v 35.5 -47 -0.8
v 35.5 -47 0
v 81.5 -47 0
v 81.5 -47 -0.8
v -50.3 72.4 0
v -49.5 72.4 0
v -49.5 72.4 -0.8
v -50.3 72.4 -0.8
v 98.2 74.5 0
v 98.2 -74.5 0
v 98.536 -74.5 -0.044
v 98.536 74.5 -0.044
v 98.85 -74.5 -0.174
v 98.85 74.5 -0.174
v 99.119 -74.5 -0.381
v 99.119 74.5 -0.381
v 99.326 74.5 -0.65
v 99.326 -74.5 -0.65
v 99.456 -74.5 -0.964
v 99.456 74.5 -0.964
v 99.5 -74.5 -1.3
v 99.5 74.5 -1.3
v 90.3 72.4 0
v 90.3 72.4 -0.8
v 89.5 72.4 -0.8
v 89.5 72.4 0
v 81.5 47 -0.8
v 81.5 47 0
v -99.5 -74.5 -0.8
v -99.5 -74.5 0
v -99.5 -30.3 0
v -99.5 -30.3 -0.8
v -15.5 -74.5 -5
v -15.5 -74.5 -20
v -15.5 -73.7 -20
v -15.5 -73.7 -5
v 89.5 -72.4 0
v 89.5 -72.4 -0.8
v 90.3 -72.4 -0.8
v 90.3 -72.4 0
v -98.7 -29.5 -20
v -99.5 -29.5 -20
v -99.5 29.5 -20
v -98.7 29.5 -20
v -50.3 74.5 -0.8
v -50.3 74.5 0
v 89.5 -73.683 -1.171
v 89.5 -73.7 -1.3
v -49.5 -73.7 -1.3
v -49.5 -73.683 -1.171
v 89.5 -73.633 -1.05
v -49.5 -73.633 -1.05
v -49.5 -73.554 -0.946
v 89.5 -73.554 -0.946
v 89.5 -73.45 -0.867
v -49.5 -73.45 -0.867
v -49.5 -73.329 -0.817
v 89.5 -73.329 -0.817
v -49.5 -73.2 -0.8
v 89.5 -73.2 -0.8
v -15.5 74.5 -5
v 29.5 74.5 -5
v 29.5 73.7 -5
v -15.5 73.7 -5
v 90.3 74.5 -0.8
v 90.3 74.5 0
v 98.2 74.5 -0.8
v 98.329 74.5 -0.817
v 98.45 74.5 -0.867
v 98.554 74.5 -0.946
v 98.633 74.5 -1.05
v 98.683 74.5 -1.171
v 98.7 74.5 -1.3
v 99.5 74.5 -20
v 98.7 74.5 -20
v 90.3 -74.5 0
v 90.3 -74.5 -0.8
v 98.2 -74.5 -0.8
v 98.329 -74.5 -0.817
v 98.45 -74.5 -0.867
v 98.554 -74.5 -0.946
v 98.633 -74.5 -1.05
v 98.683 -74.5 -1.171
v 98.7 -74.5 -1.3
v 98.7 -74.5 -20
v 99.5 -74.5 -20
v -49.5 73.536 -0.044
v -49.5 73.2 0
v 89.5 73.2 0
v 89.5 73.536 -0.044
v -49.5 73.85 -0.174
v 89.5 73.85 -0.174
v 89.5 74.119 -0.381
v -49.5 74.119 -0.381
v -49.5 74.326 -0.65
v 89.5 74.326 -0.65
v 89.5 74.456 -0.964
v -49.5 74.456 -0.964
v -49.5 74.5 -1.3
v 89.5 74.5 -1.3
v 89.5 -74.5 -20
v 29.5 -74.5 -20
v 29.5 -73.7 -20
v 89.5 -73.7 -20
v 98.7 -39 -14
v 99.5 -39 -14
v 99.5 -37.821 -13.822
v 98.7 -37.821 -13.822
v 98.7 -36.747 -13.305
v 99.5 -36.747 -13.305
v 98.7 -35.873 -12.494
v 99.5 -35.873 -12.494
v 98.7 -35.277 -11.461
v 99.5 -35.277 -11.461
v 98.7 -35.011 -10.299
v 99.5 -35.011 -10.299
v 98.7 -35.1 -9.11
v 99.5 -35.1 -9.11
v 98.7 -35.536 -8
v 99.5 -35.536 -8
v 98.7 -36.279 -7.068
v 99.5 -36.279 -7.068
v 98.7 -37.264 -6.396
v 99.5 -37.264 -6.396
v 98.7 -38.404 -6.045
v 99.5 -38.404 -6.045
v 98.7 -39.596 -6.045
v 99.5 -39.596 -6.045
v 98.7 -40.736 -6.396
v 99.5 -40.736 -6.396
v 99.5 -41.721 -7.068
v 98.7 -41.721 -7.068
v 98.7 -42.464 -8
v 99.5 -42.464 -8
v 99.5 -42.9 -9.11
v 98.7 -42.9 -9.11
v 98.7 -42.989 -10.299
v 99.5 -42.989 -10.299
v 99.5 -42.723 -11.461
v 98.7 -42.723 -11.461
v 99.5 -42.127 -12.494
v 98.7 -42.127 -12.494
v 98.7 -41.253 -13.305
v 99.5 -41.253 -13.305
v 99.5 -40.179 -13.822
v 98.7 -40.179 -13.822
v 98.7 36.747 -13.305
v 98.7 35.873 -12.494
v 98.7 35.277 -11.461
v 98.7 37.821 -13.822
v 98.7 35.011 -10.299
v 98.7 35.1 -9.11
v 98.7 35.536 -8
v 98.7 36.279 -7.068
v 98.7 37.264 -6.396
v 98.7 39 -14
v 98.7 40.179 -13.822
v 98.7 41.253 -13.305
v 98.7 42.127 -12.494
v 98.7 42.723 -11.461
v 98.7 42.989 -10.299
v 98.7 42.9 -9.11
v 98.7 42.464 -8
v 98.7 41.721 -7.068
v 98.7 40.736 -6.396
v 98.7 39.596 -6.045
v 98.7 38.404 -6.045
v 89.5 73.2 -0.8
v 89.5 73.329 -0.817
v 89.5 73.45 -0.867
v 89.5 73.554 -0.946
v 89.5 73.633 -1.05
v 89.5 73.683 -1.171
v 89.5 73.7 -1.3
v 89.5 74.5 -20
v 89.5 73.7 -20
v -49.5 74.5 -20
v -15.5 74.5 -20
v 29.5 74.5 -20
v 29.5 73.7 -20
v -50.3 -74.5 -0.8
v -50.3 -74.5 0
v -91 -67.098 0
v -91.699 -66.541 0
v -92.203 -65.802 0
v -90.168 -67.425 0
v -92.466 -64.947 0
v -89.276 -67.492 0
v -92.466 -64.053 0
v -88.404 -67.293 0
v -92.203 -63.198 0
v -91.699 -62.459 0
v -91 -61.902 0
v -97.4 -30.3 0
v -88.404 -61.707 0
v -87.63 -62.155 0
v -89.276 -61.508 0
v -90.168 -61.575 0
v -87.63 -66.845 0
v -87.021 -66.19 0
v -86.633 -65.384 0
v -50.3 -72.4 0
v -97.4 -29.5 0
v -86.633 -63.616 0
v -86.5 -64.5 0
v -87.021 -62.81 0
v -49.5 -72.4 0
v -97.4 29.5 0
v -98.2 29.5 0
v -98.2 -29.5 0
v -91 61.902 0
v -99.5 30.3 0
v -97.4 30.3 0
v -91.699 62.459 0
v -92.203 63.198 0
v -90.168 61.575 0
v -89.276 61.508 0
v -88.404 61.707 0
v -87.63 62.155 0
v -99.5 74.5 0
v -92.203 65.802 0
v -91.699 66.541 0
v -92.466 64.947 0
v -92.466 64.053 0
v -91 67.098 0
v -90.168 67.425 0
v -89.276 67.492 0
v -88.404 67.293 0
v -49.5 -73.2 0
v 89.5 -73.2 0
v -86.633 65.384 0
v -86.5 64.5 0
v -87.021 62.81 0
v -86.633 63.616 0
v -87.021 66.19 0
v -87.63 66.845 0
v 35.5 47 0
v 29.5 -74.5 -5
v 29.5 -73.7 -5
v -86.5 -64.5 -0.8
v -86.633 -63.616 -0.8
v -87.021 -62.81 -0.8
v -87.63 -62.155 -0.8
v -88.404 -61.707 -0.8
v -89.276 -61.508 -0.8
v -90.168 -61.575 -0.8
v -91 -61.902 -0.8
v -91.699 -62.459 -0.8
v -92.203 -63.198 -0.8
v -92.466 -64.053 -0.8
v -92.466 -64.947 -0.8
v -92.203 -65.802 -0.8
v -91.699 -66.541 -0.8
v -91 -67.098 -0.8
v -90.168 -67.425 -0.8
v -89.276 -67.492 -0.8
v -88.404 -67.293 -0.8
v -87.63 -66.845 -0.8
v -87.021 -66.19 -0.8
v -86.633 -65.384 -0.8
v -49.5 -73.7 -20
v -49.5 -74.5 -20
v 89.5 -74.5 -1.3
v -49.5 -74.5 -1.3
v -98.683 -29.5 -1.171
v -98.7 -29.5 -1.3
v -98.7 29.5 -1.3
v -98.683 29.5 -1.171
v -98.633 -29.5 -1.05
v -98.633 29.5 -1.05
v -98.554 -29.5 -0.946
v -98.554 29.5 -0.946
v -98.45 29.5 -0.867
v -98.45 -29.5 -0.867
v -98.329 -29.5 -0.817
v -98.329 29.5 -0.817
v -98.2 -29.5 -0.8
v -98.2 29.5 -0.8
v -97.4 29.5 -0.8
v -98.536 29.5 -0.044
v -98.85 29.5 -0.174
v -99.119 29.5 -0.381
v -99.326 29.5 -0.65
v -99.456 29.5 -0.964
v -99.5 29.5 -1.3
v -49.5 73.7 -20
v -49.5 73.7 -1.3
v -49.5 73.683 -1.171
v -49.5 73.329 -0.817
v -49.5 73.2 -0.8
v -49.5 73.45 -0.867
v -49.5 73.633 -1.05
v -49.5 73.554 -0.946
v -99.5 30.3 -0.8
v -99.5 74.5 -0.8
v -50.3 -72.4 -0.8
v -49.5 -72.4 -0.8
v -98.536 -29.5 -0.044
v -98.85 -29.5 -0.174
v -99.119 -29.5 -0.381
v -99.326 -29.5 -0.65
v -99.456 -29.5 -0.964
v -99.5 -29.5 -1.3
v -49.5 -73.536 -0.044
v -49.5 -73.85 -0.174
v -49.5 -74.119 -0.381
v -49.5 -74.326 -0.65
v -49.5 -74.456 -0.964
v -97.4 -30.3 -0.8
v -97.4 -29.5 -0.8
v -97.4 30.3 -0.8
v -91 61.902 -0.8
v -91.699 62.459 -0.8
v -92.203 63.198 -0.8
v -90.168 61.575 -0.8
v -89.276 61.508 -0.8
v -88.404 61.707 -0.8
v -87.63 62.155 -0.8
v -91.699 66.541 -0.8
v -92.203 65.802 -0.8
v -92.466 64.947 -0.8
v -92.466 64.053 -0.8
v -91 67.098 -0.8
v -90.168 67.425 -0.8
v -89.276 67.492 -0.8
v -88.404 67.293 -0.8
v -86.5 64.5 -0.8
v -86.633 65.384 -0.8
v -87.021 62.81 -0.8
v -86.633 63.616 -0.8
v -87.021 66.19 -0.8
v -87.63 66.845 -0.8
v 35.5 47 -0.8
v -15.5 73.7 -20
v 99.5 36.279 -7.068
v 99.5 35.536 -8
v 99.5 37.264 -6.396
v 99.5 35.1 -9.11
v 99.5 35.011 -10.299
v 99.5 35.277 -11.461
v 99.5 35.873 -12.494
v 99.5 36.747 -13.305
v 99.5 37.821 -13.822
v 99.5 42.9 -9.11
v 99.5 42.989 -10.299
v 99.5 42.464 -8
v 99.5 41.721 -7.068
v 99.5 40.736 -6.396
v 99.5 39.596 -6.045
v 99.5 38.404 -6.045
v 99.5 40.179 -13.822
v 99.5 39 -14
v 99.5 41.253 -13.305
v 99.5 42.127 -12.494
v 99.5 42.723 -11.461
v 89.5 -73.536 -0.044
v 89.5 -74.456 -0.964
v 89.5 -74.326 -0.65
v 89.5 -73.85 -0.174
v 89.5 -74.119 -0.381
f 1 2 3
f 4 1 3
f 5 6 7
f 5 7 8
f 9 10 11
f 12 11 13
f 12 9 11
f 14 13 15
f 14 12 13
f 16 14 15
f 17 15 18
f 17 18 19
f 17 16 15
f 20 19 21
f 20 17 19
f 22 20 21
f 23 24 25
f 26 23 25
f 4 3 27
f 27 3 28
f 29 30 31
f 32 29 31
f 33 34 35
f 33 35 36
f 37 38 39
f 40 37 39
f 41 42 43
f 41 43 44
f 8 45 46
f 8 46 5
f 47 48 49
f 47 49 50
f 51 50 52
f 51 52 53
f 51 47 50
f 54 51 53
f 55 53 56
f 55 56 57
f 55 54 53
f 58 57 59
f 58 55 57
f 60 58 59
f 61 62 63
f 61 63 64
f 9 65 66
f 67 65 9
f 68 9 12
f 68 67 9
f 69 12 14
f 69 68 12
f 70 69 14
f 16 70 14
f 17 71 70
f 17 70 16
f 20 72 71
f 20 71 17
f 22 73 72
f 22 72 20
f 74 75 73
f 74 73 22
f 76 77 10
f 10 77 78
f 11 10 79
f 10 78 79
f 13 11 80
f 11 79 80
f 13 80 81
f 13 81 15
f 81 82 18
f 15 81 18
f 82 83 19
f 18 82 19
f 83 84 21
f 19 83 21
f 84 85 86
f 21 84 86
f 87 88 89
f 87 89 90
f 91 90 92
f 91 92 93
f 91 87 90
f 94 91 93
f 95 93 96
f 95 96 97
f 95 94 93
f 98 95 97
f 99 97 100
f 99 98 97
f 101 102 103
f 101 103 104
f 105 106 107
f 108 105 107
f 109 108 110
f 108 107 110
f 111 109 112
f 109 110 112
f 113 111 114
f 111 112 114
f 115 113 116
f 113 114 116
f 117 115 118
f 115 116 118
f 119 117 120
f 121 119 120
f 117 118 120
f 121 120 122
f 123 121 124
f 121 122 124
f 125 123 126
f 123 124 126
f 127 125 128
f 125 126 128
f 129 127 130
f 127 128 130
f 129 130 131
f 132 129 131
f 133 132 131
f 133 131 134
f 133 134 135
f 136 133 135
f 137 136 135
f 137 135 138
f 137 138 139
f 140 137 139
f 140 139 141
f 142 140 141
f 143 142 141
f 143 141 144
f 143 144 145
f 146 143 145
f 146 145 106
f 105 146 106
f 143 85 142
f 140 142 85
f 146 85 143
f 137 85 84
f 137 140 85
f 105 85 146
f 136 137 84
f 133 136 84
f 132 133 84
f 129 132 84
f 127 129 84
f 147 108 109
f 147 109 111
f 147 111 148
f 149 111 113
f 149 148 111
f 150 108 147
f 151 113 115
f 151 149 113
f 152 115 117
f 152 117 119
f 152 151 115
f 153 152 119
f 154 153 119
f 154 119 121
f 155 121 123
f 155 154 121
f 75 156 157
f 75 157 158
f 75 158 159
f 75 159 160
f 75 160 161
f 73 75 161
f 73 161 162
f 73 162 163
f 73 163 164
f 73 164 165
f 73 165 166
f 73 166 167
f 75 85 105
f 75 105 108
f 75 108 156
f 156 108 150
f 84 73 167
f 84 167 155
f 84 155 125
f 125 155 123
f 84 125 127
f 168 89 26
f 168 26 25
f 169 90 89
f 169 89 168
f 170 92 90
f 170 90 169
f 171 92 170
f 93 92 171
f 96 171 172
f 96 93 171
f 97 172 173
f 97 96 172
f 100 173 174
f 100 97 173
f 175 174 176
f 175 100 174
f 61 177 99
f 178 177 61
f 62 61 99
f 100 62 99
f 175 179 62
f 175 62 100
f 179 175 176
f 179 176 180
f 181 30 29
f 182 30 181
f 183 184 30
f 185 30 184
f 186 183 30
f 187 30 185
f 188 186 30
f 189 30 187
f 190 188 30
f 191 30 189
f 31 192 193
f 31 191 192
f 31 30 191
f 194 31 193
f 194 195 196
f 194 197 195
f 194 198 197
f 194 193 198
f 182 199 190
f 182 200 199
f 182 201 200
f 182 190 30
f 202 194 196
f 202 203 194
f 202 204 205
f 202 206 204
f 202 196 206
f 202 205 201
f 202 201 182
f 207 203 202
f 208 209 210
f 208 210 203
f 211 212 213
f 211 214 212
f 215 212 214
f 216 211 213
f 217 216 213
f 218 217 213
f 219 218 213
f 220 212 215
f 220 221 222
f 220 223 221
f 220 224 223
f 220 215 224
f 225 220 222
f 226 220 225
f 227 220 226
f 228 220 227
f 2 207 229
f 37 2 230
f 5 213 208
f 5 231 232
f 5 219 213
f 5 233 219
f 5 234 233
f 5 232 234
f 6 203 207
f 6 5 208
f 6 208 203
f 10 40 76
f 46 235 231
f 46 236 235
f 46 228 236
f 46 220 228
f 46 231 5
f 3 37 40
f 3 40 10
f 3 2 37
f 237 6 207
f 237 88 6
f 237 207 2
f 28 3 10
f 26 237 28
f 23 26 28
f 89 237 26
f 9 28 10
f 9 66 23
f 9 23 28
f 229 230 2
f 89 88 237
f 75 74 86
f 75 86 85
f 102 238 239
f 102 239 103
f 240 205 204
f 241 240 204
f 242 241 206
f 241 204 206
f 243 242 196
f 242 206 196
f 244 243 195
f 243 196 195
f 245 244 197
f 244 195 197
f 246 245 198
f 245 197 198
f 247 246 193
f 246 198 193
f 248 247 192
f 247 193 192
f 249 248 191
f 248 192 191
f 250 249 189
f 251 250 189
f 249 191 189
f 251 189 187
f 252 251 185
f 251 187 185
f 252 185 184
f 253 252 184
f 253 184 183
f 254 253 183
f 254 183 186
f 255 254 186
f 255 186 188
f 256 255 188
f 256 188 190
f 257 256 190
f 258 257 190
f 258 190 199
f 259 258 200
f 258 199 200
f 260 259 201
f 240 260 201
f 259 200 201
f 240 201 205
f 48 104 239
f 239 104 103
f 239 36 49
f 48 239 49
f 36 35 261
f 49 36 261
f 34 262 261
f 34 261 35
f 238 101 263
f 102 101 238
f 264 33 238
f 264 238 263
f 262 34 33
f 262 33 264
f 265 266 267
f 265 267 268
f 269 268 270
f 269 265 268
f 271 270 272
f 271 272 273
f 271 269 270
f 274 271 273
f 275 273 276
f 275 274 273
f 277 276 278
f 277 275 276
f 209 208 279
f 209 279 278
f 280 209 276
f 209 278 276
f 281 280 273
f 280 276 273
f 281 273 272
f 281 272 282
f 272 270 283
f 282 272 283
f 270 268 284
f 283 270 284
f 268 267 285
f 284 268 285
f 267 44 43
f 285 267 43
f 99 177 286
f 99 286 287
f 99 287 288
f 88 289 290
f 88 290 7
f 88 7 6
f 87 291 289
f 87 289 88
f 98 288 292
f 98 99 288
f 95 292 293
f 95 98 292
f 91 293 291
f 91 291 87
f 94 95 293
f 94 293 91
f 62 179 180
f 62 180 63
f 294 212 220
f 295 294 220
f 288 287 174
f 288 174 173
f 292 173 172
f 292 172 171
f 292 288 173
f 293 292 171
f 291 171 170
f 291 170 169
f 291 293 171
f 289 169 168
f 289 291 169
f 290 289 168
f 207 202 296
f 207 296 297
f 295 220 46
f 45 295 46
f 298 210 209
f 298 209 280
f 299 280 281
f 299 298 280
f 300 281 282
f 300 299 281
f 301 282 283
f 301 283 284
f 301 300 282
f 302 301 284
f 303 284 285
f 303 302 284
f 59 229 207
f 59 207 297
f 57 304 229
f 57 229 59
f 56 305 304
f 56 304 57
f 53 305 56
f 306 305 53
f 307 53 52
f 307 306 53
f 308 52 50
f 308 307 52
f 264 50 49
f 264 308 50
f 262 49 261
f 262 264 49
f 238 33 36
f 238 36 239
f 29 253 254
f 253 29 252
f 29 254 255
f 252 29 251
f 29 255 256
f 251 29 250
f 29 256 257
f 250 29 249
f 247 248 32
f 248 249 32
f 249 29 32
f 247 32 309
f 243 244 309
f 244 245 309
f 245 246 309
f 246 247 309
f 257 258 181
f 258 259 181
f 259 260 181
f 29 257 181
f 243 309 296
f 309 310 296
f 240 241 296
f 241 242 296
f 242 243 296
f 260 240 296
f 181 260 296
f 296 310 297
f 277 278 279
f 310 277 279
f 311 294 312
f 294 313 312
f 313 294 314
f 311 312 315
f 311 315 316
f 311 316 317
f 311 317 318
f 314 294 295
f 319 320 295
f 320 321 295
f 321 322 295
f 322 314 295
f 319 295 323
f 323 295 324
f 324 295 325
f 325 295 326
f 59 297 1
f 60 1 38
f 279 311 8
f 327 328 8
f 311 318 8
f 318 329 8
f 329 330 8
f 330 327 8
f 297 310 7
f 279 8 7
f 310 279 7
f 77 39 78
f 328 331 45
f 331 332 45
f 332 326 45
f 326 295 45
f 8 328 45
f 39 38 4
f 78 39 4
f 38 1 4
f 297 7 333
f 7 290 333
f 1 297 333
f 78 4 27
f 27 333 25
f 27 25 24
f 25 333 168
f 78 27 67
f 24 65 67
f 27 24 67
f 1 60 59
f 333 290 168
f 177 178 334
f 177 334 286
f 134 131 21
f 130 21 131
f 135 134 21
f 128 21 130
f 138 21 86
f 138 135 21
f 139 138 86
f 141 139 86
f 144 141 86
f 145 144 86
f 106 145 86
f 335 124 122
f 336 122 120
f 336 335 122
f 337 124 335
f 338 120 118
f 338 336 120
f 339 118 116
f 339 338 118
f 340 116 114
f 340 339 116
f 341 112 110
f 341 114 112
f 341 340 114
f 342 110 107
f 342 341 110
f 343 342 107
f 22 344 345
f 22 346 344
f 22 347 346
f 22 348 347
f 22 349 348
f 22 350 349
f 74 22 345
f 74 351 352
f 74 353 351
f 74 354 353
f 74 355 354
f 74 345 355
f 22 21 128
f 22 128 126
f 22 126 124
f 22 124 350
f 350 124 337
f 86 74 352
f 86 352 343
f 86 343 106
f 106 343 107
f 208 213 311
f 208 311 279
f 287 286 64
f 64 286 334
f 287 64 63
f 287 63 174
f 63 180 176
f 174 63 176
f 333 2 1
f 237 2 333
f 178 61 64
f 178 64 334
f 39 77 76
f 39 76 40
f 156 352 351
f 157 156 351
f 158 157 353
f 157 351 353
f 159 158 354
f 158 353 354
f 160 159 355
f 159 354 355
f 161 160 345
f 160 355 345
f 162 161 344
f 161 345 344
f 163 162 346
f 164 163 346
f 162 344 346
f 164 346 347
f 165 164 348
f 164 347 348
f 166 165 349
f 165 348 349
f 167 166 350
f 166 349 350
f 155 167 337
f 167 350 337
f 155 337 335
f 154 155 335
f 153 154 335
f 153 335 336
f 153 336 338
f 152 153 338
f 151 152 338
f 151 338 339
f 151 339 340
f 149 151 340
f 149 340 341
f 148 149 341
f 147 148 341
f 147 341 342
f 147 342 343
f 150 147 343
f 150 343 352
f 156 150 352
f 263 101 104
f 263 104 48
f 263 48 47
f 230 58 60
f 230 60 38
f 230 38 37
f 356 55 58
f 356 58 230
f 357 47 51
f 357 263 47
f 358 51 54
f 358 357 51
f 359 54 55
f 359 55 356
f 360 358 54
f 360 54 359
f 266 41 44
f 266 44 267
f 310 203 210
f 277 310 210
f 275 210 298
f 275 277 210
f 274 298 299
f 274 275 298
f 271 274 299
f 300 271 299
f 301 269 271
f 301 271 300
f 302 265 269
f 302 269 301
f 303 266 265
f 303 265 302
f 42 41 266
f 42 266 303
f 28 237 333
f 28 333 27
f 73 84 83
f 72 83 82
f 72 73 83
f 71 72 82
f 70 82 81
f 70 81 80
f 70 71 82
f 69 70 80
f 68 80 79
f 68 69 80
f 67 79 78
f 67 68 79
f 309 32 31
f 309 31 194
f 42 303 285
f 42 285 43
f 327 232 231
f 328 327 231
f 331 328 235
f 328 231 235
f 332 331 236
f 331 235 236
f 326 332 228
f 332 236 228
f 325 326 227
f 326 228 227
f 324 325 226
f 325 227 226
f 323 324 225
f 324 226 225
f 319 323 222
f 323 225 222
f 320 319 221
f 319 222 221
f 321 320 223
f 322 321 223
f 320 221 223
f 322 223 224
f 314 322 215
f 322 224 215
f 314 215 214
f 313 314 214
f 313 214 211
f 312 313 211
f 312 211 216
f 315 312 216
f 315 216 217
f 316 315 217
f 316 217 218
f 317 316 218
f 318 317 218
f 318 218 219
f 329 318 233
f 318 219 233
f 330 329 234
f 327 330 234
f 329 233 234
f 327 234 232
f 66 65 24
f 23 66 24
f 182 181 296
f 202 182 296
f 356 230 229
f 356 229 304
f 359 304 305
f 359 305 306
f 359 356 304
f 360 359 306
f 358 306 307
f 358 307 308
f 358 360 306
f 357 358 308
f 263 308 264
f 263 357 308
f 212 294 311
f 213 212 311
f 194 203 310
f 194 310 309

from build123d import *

# Parameters (mm, degrees)
SKETCH_1_W                        = 199
SKETCH_1_H                        = 149
SKETCH_1_R                        = 3
SKETCH_1_W_2                      = 46
SKETCH_1_H_2                      = 94
SM_BASE_FLANGE_1_DEPTH            = 0.8
SM_EDGE_FLANGE_1_STRIP_W          = 4.2
SM_EDGE_FLANGE_1_STRIP_H          = 0.8
SM_EDGE_FLANGE_1_STRIP_CUT_DEPTH  = 59
SM_EDGE_FLANGE_1_RELIEF_W         = 5
SM_EDGE_FLANGE_1_RELIEF_H         = 0.8
SM_EDGE_FLANGE_1_RELIEF_CUT_DEPTH = 0.8
SM_EDGE_FLANGE_1_DEPTH            = 59
SM_EDGE_FLANGE_3_STRIP_W          = 4.2
SM_EDGE_FLANGE_3_STRIP_H          = 0.8
SM_EDGE_FLANGE_3_STRIP_CUT_DEPTH  = 139
SM_EDGE_FLANGE_3_RELIEF_W         = 5
SM_EDGE_FLANGE_3_RELIEF_H         = 0.8
SM_EDGE_FLANGE_3_RELIEF_CUT_DEPTH = 0.8
SM_EDGE_FLANGE_3_DEPTH            = 139
SM_EDGE_FLANGE_3_FLAT_DEPTH       = 0.8
SM_EDGE_FLANGE_4_STRIP_W          = 4.2
SM_EDGE_FLANGE_4_STRIP_H          = 0.8
SM_EDGE_FLANGE_4_STRIP_CUT_DEPTH  = 139
SM_EDGE_FLANGE_4_RELIEF_W         = 5
SM_EDGE_FLANGE_4_RELIEF_H         = 0.8
SM_EDGE_FLANGE_4_RELIEF_CUT_DEPTH = 0.8
SM_EDGE_FLANGE_4_DEPTH            = 139
SM_EDGE_FLANGE_4_FLAT_DEPTH       = 0.8
SM_EDGE_FLANGE_5_STRIP_W          = 4.2
SM_EDGE_FLANGE_5_STRIP_H          = 0.8
SM_EDGE_FLANGE_5_STRIP_CUT_DEPTH  = 149
SM_EDGE_FLANGE_5_DEPTH            = 149
SKETCH_21_R                       = 4
CUT_EXTRUDE_1_DEPTH               = 214.427388121


# Sheet-metal steps are written as plain solids
with BuildPart() as part:
    # Sketch 1 → 基体-法兰1 (new body)
    with BuildSketch(Plane.XY):
        Rectangle(SKETCH_1_W, SKETCH_1_H)
        with Locations((-89.5, 64.5)):
            Circle(SKETCH_1_R, mode=Mode.SUBTRACT)
        with Locations((-89.5, -64.5)):
            Circle(SKETCH_1_R, mode=Mode.SUBTRACT)
        with Locations((58.5, 0)):
            Rectangle(SKETCH_1_W_2, SKETCH_1_H_2, mode=Mode.SUBTRACT)
    extrude(amount=-SM_BASE_FLANGE_1_DEPTH)

    # 边线-法兰1 strip (across the edge) → 边线-法兰1 strip cut (cut)
    with BuildSketch(Plane(origin=(-99.5, -29.5, -0.8), x_dir=(1, 0, 0), z_dir=(0, 1, 0))):
        with Locations((-0.8, -0.4)):
            Rectangle(SM_EDGE_FLANGE_1_STRIP_W, SM_EDGE_FLANGE_1_STRIP_H)
    extrude(amount=SM_EDGE_FLANGE_1_STRIP_CUT_DEPTH, mode=Mode.SUBTRACT)

    # 边线-法兰1 relief (on the sheet) → 边线-法兰1 relief cut (cut)
    with BuildSketch(Plane(origin=(-98.2, -29.5, -0.8), x_dir=(1, 0, 0), z_dir=(0, 0, -1))):
        with Locations((-1.7, 0.4)):
            Rectangle(SM_EDGE_FLANGE_1_RELIEF_W, SM_EDGE_FLANGE_1_RELIEF_H)
        with Locations((-1.7, -59.4)):
            Rectangle(SM_EDGE_FLANGE_1_RELIEF_W, SM_EDGE_FLANGE_1_RELIEF_H)
    extrude(amount=-SM_EDGE_FLANGE_1_RELIEF_CUT_DEPTH, mode=Mode.SUBTRACT)

    # 边线-法兰1 section (across the edge) → 边线-法兰1 (add)
    with BuildSketch(Plane(origin=(-99.5, -29.5, -0.8), x_dir=(1, 0, 0), z_dir=(0, 1, 0))):
        with BuildLine():
            Line((0, 0.5), (0, 19.2))
            Line((0, 19.2), (0.8, 19.2))
            Line((0.8, 19.2), (0.8, 0.5))
            ThreePointArc((0.8, 0.5), (0.946446609, 0.146446609), (1.3, 0))
            Line((1.3, 0), (1.3, -0.8))
            ThreePointArc((1.3, -0.8), (0.380761184, -0.419238816), (0, 0.5))
        make_face()
    extrude(amount=SM_EDGE_FLANGE_1_DEPTH)

    # 边线-法兰3 strip (across the edge) → 边线-法兰3 strip cut (cut)
    with BuildSketch(Plane(origin=(89.5, -74.5, -0.8), x_dir=(0, 1, 0), z_dir=(-1, 0, 0))):
        with Locations((-0.8, -0.4)):
            Rectangle(SM_EDGE_FLANGE_3_STRIP_W, SM_EDGE_FLANGE_3_STRIP_H)
    extrude(amount=SM_EDGE_FLANGE_3_STRIP_CUT_DEPTH, mode=Mode.SUBTRACT)

    # 边线-法兰3 relief (on the sheet) → 边线-法兰3 relief cut (cut)
    with BuildSketch(Plane(origin=(89.5, -73.2, -0.8), x_dir=(0, 1, 0), z_dir=(0, 0, -1))):
        with Locations((-1.7, 0.4)):
            Rectangle(SM_EDGE_FLANGE_3_RELIEF_W, SM_EDGE_FLANGE_3_RELIEF_H)
        with Locations((-1.7, -139.4)):
            Rectangle(SM_EDGE_FLANGE_3_RELIEF_W, SM_EDGE_FLANGE_3_RELIEF_H)
    extrude(amount=-SM_EDGE_FLANGE_3_RELIEF_CUT_DEPTH, mode=Mode.SUBTRACT)

    # 边线-法兰3 bend section (across the edge) → 边线-法兰3 (add)
    with BuildSketch(Plane(origin=(89.5, -74.5, -0.8), x_dir=(0, 1, 0), z_dir=(-1, 0, 0))):
        with BuildLine():
            Line((0, 0.5), (0.8, 0.5))
            ThreePointArc((0.8, 0.5), (0.946446609, 0.146446609), (1.3, 0))
            Line((1.3, 0), (1.3, -0.8))
            ThreePointArc((1.3, -0.8), (0.380761184, -0.419238816), (0, 0.5))
        make_face()
    extrude(amount=SM_EDGE_FLANGE_3_DEPTH)

    # 边线-法兰3 profile (on flange) → 边线-法兰3 flat (add)
    with BuildSketch(Plane(origin=(0, -74.5, -0.8), x_dir=(-1, 0, 0), z_dir=(0, -1, 0))):
        Polygon((49.5, 0.5), (49.5, 19.2), (15.5, 19.2), (15.5, 4.2), (-29.5, 4.2), (-29.5, 19.2), (-89.5, 19.2), (-89.5, 0.5), align=None)
    extrude(amount=-SM_EDGE_FLANGE_3_FLAT_DEPTH)

    # 边线-法兰4 strip (across the edge) → 边线-法兰4 strip cut (cut)
    with BuildSketch(Plane(origin=(-49.5, 74.5, -0.8), x_dir=(0, -1, 0), z_dir=(1, 0, 0))):
        with Locations((-0.8, -0.4)):
            Rectangle(SM_EDGE_FLANGE_4_STRIP_W, SM_EDGE_FLANGE_4_STRIP_H)
    extrude(amount=SM_EDGE_FLANGE_4_STRIP_CUT_DEPTH, mode=Mode.SUBTRACT)

    # 边线-法兰4 relief (on the sheet) → 边线-法兰4 relief cut (cut)
    with BuildSketch(Plane(origin=(-49.5, 73.2, -0.8), x_dir=(0, -1, 0), z_dir=(0, 0, -1))):
        with Locations((-1.7, 0.4)):
            Rectangle(SM_EDGE_FLANGE_4_RELIEF_W, SM_EDGE_FLANGE_4_RELIEF_H)
        with Locations((-1.7, -139.4)):
            Rectangle(SM_EDGE_FLANGE_4_RELIEF_W, SM_EDGE_FLANGE_4_RELIEF_H)
    extrude(amount=-SM_EDGE_FLANGE_4_RELIEF_CUT_DEPTH, mode=Mode.SUBTRACT)

    # 边线-法兰4 bend section (across the edge) → 边线-法兰4 (add)
    with BuildSketch(Plane(origin=(-49.5, 74.5, -0.8), x_dir=(0, -1, 0), z_dir=(1, 0, 0))):
        with BuildLine():
            Line((0, 0.5), (0.8, 0.5))
            ThreePointArc((0.8, 0.5), (0.946446609, 0.146446609), (1.3, 0))
            Line((1.3, 0), (1.3, -0.8))
            ThreePointArc((1.3, -0.8), (0.380761184, -0.419238816), (0, 0.5))
        make_face()
    extrude(amount=SM_EDGE_FLANGE_4_DEPTH)

    # 边线-法兰4 profile (on flange) → 边线-法兰4 flat (add)
    with BuildSketch(Plane(origin=(0, 74.5, -0.8), x_dir=(1, 0, 0), z_dir=(0, 1, 0))):
        Polygon((89.5, 0.5), (89.5, 19.2), (29.5, 19.2), (29.5, 4.2), (-15.5, 4.2), (-15.5, 19.2), (-49.5, 19.2), (-49.5, 0.5), align=None)
    extrude(amount=-SM_EDGE_FLANGE_4_FLAT_DEPTH)

    # 边线-法兰5 strip (across the edge) → 边线-法兰5 strip cut (cut)
    with BuildSketch(Plane(origin=(99.5, 74.5, -0.8), x_dir=(-1, 0, 0), z_dir=(0, -1, 0))):
        with Locations((-0.8, -0.4)):
            Rectangle(SM_EDGE_FLANGE_5_STRIP_W, SM_EDGE_FLANGE_5_STRIP_H)
    extrude(amount=SM_EDGE_FLANGE_5_STRIP_CUT_DEPTH, mode=Mode.SUBTRACT)

    # 边线-法兰5 section (across the edge) → 边线-法兰5 (add)
    with BuildSketch(Plane(origin=(99.5, 74.5, -0.8), x_dir=(-1, 0, 0), z_dir=(0, -1, 0))):
        with BuildLine():
            Line((0, 0.5), (0, 19.2))
            Line((0, 19.2), (0.8, 19.2))
            Line((0.8, 19.2), (0.8, 0.5))
            ThreePointArc((0.8, 0.5), (0.946446609, 0.146446609), (1.3, 0))
            Line((1.3, 0), (1.3, -0.8))
            ThreePointArc((1.3, -0.8), (0.380761184, -0.419238816), (0, 0.5))
        make_face()
    extrude(amount=SM_EDGE_FLANGE_5_DEPTH)

    # 草图21 → 切除-拉伸1 (cut, through all)
    with BuildSketch(Plane(origin=(99.5, 0, 0), x_dir=(0, 0, -1), z_dir=(1, 0, 0))):
        with Locations((10, -39)):
            Circle(SKETCH_21_R)
        with Locations((10, 39)):
            Circle(SKETCH_21_R)
    extrude(amount=-CUT_EXTRUDE_1_DEPTH, mode=Mode.SUBTRACT)


solid = part.part
